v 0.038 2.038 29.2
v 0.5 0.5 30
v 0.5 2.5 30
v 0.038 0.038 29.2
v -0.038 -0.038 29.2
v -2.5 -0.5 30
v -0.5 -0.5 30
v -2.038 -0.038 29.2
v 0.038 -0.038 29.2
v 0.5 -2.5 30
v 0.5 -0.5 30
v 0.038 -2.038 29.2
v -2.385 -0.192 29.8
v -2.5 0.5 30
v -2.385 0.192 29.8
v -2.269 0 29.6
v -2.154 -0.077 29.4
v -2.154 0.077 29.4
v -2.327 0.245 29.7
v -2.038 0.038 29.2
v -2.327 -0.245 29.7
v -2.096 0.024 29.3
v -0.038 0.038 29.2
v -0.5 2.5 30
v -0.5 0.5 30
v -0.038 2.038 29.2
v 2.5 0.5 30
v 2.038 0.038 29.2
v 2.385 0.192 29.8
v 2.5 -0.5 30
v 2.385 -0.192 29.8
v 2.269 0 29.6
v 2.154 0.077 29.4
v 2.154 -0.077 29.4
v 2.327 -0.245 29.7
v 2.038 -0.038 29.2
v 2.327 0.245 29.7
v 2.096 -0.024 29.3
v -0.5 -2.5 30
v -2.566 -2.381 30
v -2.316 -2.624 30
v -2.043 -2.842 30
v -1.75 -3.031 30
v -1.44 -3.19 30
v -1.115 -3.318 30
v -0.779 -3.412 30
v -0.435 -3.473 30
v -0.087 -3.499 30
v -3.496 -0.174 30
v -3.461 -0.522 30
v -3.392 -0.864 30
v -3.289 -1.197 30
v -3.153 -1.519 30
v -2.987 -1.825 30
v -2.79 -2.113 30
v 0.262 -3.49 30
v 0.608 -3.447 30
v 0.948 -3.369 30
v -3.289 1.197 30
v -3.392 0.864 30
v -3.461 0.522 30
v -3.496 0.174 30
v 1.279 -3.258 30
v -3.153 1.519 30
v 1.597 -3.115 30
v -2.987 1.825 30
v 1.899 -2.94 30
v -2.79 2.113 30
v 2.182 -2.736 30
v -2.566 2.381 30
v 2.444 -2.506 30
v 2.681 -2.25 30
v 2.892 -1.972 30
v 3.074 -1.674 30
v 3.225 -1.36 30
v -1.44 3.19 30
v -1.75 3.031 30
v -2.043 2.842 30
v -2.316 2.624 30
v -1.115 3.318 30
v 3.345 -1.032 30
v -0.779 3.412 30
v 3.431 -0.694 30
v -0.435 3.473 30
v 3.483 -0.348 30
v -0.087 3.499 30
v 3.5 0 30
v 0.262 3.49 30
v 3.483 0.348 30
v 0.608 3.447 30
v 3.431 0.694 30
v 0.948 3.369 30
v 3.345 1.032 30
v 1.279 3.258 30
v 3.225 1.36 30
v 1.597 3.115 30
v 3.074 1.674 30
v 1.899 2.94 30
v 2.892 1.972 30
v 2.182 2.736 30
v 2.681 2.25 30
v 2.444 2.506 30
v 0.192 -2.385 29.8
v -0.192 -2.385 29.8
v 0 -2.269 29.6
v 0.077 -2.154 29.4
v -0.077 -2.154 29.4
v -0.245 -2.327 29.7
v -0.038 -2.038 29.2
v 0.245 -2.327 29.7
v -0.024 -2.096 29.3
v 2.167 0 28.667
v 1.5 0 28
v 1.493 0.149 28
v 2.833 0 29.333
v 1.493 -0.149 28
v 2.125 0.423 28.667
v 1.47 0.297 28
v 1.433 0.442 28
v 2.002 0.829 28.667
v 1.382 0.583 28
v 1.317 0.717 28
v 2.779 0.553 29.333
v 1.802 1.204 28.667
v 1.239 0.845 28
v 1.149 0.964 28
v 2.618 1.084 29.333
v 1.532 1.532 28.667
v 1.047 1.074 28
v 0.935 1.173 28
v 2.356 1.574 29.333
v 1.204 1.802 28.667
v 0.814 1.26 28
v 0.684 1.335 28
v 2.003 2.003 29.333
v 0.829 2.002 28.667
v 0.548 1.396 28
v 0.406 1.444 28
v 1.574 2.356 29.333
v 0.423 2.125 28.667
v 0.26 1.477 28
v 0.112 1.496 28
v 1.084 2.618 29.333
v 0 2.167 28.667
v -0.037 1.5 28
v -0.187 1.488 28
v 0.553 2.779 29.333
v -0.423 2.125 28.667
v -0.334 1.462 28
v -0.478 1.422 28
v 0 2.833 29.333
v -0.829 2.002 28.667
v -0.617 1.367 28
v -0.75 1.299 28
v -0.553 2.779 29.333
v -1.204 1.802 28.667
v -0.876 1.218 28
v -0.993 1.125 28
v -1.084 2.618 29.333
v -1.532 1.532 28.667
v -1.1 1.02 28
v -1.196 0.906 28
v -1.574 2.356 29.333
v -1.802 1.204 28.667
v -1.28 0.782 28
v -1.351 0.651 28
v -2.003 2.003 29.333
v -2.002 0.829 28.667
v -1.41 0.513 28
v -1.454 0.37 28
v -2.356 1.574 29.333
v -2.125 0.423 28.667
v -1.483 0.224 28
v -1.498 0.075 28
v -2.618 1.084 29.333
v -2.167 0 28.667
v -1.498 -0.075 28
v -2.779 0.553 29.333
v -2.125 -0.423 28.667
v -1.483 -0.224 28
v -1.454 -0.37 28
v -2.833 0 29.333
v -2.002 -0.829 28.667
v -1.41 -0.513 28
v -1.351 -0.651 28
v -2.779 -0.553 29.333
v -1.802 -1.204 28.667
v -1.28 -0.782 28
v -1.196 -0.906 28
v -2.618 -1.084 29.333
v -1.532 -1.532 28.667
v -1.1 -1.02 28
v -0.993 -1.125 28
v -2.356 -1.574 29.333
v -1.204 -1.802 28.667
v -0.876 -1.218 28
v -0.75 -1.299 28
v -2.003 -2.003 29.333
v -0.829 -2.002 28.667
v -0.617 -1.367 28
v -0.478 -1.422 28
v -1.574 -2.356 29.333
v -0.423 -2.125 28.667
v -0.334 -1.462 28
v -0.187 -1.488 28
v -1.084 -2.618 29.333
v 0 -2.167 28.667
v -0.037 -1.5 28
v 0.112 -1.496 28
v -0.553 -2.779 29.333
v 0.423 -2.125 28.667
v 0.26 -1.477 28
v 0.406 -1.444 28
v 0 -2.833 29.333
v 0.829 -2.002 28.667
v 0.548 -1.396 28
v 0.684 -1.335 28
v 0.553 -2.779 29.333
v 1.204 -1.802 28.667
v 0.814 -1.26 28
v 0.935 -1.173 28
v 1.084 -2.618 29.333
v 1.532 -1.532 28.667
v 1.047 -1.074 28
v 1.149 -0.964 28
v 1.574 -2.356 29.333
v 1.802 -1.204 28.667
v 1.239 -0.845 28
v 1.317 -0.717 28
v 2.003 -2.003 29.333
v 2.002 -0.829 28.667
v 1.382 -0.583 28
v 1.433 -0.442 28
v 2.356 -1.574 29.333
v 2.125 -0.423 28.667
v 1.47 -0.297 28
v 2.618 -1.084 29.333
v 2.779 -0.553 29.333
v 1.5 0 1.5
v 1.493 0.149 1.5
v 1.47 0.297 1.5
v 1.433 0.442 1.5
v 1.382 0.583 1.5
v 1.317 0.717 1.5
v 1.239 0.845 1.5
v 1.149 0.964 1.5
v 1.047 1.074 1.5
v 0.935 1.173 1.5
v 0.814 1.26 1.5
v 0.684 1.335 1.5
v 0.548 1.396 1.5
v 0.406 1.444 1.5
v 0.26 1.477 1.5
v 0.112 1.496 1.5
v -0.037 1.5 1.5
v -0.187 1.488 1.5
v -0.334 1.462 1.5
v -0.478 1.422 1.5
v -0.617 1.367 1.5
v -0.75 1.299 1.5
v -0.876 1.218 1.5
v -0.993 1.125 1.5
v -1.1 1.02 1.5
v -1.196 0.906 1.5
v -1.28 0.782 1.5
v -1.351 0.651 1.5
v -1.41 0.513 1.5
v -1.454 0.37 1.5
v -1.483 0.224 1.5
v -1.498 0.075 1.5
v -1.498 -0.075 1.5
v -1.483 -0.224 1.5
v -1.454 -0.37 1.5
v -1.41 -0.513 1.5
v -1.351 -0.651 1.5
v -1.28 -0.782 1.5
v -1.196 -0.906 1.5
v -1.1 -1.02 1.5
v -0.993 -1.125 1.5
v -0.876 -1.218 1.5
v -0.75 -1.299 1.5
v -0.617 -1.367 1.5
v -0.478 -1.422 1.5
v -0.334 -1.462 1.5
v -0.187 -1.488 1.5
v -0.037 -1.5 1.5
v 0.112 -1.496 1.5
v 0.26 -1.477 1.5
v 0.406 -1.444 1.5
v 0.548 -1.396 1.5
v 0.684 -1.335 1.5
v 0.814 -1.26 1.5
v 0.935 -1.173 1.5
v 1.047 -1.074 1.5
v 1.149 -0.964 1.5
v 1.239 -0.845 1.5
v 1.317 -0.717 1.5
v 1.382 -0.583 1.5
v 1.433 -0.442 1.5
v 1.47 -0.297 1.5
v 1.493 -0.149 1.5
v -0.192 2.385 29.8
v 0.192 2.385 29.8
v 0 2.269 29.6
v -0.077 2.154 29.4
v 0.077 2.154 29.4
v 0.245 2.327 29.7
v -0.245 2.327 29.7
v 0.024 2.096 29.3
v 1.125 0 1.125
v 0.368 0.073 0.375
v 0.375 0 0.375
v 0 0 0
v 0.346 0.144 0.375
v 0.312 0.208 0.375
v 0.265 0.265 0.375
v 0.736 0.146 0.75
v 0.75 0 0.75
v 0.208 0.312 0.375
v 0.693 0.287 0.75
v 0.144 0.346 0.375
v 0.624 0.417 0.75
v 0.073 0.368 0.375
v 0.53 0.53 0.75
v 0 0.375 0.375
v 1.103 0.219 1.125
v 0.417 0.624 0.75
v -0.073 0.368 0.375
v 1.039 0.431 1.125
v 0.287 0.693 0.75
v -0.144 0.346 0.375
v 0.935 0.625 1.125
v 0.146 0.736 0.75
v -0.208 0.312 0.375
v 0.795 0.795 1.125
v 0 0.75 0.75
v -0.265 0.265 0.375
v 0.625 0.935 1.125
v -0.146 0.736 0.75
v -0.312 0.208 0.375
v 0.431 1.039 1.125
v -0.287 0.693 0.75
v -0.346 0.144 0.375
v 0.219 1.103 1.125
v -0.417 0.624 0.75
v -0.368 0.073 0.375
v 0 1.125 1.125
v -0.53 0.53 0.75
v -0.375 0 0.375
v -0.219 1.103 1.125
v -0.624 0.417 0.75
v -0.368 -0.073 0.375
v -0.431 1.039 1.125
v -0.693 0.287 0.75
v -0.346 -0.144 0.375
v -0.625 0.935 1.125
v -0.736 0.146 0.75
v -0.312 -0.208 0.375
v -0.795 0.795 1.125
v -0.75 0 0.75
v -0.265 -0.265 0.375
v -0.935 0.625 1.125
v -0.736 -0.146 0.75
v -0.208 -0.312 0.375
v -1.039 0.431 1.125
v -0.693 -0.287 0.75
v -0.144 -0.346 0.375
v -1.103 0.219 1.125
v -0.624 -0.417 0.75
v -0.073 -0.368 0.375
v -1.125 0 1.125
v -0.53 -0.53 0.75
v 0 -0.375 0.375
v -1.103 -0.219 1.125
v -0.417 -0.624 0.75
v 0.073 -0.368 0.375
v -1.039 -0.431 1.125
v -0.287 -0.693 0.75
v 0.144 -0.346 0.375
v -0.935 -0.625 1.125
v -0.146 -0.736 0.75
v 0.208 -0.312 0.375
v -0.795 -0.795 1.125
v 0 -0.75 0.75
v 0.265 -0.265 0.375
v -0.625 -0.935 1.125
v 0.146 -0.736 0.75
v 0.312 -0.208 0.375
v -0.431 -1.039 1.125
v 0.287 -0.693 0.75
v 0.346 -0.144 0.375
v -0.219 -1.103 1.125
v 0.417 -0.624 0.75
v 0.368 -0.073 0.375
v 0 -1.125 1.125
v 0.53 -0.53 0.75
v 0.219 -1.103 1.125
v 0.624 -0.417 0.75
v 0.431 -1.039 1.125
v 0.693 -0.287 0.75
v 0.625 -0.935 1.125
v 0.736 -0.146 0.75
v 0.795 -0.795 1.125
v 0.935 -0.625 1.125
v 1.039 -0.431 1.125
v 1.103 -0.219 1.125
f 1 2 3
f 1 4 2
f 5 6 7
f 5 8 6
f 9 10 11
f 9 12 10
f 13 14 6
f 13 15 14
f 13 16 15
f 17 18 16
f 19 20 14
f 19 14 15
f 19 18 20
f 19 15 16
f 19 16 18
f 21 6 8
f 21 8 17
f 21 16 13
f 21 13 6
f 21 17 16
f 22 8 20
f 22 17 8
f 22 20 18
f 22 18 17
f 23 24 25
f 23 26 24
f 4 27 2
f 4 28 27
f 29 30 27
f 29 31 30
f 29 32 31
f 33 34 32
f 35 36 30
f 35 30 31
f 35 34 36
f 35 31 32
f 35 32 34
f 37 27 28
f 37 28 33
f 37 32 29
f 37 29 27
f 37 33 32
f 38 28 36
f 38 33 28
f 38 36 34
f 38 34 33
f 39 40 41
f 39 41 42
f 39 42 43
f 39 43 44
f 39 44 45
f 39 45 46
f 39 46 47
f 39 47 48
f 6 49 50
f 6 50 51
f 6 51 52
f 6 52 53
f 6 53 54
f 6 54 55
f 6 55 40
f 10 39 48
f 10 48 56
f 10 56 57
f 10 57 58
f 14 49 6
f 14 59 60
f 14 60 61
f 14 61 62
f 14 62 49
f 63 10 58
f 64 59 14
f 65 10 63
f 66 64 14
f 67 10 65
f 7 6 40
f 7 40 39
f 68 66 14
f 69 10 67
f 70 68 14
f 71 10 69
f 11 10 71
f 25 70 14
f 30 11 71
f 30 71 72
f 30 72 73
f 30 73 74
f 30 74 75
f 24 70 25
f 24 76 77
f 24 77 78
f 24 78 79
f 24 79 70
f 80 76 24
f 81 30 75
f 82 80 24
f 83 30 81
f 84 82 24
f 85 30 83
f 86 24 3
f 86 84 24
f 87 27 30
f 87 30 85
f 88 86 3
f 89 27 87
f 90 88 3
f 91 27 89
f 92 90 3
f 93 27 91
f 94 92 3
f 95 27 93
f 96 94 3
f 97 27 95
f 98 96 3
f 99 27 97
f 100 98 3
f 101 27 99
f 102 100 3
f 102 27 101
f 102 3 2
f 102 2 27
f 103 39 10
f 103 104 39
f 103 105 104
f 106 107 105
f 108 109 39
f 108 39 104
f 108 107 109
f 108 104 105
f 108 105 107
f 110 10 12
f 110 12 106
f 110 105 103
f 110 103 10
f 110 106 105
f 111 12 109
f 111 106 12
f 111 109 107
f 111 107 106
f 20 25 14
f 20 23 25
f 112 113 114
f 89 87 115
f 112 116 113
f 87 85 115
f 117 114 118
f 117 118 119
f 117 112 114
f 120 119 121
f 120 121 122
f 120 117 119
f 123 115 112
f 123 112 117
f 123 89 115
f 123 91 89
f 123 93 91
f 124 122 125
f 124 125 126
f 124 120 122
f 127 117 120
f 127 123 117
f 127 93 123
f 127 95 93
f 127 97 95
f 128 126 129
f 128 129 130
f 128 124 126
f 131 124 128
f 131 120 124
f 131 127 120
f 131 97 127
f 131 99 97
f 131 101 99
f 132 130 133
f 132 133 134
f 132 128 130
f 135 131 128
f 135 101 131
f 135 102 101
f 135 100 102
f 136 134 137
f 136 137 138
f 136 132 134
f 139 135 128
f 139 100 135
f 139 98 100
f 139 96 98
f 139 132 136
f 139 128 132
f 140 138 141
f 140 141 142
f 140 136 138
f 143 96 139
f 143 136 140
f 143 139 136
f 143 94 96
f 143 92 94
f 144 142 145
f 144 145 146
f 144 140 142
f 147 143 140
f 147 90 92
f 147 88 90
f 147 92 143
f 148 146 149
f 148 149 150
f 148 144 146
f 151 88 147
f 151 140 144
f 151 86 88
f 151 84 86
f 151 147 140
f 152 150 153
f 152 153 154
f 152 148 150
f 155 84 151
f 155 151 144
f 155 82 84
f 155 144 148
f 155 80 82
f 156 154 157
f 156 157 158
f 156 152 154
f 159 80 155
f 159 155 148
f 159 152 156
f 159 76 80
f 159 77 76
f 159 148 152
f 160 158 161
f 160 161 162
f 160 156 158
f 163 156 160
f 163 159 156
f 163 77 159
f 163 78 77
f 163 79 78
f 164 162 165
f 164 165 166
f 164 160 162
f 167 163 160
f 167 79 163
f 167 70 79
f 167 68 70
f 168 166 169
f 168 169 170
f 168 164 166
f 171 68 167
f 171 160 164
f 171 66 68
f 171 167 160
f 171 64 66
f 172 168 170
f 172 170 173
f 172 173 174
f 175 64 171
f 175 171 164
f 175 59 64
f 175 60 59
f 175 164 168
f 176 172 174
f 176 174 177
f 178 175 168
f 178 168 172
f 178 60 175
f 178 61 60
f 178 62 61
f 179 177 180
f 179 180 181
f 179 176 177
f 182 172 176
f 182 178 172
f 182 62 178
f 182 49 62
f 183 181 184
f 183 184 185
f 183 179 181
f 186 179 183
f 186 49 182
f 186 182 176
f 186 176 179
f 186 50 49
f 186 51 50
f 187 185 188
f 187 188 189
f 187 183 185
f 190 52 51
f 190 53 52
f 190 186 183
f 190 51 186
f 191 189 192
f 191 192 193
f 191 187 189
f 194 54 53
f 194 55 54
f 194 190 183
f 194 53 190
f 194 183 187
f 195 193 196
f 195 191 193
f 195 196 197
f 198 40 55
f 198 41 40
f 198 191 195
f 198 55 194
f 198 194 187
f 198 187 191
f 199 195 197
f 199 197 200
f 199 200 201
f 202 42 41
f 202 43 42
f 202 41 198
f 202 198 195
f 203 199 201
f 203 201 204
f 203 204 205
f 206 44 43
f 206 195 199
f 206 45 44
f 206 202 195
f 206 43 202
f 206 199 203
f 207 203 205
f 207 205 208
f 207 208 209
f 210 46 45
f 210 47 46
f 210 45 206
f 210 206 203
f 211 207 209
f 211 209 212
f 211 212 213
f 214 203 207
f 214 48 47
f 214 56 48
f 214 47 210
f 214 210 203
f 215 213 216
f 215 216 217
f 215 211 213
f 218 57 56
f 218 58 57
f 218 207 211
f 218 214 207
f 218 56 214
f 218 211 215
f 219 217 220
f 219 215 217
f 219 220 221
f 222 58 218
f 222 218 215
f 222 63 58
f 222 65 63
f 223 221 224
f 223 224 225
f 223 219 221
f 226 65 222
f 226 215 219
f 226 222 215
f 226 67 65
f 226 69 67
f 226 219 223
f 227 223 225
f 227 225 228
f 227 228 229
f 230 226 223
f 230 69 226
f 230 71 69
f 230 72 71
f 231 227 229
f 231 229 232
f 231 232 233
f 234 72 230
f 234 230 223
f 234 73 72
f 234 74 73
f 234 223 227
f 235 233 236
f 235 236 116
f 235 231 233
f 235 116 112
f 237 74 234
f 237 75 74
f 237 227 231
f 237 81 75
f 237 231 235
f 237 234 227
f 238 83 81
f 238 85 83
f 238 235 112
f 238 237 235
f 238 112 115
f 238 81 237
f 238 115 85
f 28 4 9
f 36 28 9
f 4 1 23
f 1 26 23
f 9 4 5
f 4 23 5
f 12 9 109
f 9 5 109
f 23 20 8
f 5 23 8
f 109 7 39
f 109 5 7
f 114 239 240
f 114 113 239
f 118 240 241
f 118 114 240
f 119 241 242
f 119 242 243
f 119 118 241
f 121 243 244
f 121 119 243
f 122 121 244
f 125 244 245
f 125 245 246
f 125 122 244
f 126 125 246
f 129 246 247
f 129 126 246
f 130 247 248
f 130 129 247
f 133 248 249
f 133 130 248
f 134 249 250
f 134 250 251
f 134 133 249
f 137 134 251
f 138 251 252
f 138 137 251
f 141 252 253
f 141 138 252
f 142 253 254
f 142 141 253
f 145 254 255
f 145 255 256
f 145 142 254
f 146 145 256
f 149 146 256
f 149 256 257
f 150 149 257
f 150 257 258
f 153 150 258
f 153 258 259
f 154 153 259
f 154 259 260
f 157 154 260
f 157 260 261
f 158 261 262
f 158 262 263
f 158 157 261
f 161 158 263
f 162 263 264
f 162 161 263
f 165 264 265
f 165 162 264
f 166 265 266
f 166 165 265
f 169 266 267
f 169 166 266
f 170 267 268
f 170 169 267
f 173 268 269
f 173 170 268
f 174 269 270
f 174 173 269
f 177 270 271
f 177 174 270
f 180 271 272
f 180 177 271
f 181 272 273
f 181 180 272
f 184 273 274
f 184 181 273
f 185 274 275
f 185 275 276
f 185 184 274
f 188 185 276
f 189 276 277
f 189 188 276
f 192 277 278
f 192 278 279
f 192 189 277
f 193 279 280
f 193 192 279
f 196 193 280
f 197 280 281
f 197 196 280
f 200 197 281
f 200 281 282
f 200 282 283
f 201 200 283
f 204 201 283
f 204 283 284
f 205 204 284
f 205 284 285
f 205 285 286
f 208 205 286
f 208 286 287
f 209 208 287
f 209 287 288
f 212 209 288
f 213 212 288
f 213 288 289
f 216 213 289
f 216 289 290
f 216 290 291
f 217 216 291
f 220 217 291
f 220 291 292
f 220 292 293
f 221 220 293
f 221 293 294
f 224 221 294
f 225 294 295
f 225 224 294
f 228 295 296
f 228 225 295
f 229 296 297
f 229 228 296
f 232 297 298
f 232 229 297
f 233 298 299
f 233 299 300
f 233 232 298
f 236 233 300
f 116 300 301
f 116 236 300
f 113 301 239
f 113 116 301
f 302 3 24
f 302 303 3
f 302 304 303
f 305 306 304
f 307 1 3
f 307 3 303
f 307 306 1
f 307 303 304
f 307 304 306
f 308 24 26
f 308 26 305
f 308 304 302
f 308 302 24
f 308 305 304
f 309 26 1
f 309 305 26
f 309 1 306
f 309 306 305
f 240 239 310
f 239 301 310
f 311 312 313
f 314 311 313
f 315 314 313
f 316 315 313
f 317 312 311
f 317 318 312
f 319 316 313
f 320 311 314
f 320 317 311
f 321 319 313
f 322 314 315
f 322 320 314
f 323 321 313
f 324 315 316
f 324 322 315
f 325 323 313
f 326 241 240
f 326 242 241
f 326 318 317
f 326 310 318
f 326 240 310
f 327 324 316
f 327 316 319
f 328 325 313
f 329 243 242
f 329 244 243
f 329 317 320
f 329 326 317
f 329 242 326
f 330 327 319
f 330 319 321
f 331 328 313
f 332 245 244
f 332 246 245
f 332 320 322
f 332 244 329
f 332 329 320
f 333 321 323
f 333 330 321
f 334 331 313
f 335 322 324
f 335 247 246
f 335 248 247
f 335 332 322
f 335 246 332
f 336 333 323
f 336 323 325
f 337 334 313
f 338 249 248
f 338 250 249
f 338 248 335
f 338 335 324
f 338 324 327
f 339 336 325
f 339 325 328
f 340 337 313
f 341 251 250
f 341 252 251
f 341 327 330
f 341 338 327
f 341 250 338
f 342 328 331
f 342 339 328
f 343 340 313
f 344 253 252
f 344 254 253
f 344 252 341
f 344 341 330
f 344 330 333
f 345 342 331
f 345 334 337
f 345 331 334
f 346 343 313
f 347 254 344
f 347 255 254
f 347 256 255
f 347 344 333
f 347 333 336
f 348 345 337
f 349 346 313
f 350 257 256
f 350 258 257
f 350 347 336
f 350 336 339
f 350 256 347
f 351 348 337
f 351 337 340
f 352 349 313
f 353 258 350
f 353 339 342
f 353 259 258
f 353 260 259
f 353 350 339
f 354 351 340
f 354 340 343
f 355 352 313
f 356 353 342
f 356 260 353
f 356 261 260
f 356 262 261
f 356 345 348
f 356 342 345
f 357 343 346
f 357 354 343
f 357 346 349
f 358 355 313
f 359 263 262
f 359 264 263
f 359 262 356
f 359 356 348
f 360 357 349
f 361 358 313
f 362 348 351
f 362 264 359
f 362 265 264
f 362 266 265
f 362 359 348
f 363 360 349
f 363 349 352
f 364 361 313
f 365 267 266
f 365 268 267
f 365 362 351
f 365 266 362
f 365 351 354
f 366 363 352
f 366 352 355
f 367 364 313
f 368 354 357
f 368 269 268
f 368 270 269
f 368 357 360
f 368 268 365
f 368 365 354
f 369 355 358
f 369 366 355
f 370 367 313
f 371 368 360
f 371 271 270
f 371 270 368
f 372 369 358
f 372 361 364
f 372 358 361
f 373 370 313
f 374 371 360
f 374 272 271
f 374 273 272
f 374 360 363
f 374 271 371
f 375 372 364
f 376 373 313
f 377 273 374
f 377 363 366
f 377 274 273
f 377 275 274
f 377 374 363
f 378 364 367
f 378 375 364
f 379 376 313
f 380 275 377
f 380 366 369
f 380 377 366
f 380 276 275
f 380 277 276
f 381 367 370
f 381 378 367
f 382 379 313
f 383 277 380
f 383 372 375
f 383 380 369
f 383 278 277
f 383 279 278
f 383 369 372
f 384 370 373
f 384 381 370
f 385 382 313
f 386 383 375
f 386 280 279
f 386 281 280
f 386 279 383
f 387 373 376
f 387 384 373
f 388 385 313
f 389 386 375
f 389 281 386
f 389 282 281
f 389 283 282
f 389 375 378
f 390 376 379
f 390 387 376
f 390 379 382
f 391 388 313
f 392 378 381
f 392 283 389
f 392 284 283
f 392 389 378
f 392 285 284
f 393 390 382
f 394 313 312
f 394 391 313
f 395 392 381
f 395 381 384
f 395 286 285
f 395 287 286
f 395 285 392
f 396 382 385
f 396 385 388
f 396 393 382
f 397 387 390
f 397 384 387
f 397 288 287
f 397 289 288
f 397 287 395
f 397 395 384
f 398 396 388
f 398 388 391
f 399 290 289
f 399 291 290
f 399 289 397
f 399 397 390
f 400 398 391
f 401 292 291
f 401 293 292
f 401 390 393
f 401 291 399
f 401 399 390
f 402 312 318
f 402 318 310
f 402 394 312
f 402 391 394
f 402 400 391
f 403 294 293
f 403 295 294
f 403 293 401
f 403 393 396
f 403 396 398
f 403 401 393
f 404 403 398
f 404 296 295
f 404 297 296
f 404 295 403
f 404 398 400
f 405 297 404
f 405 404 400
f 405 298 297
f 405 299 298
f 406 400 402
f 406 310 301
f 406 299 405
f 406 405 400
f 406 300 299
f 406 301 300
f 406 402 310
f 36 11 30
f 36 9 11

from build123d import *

# Parameters (mm, degrees)
F3_DEPTH = 0.8
F3_TAPER = 30


with BuildPart() as f1:
    # F0 (on Front) → F1 (revolve)
    with BuildSketch(Plane.XZ):
        Polygon((0, 30), (0, 0), (1.5, 1.5), (1.5, 28), (3.5, 30), align=None)
    revolve(axis=Axis((0, 0, 15), (0, 0, 1)))

    # F2 (on face) → F3 (cut)
    with BuildSketch(Plane.XY.offset(30)):
        Polygon((0.5, 2.5), (-0.5, 2.5), (-0.5, 0.5), (-2.5, 0.5), (-2.5, -0.5), (-0.5, -0.5), (-0.5, -2.5), (0.5, -2.5), (0.5, -0.5), (2.5, -0.5), (2.5, 0.5), (0.5, 0.5), align=None)
    extrude(amount=-F3_DEPTH, taper=F3_TAPER, mode=Mode.SUBTRACT)


solid = f1.part
